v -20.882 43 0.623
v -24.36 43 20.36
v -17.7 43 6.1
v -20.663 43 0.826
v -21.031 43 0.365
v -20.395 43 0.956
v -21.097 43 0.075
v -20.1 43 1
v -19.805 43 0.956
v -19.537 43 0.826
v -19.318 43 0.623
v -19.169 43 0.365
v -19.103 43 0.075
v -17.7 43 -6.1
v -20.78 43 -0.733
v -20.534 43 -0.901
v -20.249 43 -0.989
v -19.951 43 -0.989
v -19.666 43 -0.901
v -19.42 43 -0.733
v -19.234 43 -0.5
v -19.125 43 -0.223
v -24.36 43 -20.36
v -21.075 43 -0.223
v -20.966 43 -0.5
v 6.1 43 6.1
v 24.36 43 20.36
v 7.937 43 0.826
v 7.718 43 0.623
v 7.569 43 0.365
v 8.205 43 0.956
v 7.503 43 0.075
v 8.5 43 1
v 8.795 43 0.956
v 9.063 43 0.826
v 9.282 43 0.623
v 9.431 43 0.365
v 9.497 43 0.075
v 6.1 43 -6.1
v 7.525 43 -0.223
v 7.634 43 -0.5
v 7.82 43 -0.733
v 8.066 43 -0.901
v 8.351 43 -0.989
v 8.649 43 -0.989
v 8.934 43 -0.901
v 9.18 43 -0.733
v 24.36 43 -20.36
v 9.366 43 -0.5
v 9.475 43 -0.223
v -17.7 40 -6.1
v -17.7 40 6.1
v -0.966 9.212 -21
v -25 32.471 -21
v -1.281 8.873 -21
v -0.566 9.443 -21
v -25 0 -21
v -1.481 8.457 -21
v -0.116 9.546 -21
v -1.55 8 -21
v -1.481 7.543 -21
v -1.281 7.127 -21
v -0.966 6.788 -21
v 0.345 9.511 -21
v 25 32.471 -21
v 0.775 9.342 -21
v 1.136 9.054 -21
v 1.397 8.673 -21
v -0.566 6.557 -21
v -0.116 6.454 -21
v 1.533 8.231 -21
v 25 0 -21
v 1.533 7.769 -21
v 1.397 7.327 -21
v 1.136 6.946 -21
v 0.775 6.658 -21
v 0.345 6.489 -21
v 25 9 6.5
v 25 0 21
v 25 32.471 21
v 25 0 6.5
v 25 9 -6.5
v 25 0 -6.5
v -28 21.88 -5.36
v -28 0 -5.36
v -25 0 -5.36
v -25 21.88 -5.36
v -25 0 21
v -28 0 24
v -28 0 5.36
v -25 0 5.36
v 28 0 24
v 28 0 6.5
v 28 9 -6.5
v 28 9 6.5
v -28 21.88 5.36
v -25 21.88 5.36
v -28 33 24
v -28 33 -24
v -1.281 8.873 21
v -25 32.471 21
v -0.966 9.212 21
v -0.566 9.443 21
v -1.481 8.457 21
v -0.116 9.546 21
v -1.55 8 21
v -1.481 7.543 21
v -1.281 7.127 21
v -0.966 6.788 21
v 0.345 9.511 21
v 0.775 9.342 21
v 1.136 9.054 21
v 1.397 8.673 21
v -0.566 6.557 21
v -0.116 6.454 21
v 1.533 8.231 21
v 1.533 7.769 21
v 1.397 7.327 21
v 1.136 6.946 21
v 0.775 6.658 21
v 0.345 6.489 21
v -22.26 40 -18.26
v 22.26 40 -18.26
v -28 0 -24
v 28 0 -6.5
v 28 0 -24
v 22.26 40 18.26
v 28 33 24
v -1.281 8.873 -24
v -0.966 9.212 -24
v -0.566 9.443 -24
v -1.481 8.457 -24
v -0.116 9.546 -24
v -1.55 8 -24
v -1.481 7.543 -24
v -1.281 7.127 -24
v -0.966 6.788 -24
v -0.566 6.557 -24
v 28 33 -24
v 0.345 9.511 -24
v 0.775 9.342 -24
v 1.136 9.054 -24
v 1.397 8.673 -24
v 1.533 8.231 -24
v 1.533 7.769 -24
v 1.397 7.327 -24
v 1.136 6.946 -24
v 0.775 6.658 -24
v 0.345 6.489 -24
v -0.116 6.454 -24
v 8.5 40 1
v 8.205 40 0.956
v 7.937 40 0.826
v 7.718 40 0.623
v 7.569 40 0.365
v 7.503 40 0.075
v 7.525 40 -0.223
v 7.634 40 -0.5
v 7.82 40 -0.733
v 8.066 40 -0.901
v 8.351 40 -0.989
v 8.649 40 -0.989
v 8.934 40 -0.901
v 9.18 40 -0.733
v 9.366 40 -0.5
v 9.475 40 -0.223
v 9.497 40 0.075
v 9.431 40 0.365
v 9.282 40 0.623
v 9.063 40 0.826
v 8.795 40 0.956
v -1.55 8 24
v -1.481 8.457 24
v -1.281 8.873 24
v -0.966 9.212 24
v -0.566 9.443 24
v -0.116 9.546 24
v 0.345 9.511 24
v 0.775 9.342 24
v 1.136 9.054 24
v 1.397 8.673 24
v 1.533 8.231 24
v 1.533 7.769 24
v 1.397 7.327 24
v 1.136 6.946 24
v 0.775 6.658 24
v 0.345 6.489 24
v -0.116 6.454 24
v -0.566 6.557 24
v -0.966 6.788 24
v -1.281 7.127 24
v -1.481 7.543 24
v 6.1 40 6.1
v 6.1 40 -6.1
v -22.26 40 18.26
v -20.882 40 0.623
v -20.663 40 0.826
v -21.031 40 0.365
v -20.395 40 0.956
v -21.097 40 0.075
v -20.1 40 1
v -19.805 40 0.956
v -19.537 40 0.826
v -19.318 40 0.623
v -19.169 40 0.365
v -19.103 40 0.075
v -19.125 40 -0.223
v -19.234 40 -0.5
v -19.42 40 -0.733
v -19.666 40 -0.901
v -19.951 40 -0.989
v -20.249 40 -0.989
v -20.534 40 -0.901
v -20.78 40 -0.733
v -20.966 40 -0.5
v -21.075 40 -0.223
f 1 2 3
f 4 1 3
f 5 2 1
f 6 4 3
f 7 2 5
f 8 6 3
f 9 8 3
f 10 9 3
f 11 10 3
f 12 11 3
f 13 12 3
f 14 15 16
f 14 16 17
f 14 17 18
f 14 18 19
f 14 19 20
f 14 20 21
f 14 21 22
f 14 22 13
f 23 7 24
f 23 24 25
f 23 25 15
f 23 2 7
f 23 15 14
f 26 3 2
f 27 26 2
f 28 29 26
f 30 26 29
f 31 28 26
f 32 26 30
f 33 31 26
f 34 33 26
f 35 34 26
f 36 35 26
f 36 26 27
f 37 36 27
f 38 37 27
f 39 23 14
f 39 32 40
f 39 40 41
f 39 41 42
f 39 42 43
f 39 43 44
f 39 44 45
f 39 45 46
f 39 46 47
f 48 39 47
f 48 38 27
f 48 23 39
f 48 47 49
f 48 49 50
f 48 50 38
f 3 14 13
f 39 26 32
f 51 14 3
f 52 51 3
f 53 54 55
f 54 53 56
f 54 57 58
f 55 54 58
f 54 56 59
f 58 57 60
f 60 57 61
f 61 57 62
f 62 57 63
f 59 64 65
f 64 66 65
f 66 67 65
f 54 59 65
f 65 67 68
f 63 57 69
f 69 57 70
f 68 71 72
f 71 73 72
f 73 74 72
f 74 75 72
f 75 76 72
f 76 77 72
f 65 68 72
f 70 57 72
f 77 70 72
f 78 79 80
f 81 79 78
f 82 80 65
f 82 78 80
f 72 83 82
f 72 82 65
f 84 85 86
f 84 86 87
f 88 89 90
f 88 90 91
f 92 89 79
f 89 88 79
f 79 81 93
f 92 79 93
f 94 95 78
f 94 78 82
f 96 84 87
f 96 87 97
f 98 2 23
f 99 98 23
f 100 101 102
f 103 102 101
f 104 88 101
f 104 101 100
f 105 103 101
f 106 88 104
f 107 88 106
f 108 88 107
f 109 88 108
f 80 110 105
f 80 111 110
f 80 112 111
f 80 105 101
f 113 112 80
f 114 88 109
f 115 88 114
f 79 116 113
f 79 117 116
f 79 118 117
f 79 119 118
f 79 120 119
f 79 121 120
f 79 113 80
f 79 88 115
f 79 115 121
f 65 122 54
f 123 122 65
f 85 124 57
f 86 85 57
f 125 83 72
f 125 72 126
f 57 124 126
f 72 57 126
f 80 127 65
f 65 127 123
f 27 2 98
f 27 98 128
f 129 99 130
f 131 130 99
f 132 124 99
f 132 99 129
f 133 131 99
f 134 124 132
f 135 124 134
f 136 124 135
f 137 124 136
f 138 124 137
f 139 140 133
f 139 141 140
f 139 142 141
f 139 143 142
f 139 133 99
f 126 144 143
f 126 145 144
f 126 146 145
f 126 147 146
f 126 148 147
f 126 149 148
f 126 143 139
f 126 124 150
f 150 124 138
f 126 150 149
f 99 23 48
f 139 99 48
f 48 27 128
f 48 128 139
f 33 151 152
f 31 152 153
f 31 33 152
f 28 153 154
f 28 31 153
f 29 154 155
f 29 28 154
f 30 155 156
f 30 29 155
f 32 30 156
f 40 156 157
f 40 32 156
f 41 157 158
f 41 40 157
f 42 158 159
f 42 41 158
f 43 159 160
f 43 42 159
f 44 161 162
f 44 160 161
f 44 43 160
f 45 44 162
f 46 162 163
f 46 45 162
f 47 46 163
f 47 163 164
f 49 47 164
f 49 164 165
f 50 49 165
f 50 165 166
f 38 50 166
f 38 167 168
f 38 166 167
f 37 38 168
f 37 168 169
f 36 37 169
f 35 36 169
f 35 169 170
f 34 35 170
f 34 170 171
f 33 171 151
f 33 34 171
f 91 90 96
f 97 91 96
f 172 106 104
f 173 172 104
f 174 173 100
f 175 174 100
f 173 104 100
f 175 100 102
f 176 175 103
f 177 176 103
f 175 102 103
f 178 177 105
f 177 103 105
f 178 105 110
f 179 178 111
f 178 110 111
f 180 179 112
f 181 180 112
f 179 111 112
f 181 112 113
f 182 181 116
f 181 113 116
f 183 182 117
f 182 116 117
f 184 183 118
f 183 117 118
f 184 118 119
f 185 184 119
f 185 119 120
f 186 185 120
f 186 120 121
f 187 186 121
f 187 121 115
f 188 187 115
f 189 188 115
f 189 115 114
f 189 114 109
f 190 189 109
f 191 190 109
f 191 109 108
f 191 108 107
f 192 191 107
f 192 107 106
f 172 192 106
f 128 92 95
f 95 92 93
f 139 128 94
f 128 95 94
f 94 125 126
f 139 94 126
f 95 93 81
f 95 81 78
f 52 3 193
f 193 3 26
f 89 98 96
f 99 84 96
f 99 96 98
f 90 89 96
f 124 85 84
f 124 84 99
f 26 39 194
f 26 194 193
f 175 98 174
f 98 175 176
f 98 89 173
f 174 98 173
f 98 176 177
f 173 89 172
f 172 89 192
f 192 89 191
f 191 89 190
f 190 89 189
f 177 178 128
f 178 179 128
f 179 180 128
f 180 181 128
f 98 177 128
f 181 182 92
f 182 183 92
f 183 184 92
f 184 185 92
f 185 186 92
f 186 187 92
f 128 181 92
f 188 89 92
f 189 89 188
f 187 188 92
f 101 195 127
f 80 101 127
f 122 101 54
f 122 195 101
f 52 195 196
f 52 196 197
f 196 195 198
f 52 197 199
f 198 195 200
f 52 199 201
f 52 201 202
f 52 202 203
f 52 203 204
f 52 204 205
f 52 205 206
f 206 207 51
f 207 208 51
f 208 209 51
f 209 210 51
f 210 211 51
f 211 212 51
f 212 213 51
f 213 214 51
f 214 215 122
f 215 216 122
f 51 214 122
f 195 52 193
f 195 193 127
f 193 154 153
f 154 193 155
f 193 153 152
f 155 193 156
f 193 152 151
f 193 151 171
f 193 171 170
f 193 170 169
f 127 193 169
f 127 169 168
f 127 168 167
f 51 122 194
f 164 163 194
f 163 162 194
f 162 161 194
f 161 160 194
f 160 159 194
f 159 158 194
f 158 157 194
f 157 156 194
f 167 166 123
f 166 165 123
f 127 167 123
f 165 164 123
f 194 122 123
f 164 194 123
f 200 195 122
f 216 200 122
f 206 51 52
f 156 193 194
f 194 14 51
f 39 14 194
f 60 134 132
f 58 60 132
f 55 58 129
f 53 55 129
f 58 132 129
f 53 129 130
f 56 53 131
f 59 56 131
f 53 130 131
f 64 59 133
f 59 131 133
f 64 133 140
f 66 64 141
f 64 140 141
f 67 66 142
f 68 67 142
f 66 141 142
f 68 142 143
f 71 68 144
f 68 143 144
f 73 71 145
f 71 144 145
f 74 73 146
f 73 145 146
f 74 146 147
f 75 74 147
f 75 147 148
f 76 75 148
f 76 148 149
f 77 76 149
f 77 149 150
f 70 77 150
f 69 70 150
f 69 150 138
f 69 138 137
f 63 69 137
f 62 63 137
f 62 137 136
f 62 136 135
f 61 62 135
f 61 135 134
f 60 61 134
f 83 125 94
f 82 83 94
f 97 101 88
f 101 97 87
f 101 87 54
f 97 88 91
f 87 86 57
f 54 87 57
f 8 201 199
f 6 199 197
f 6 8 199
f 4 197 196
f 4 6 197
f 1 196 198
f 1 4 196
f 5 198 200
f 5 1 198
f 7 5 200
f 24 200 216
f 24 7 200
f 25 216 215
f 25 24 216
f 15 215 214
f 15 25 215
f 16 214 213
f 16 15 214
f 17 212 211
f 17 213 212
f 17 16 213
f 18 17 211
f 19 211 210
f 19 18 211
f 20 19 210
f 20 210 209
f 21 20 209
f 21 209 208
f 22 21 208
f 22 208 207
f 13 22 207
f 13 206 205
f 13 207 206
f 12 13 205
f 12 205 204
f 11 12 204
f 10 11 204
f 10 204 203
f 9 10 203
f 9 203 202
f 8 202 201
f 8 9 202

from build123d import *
from OCP.BRepFilletAPI import BRepFilletAPI_MakeChamfer

# Parameters (mm, degrees)
SKETCH_47_W         = 56
SKETCH_47_H         = 48
EXTRUDE_4_DEPTH     = 43
CHAMFER_1_SIZE      = 10
CHAMFER_1_SIZE2     = 3.639702343
SHELL_1_T           = -3
CUT_EXTRUDE_3_REACH = 86.392
SKETCH_48_R         = 1
SKETCH_48_W         = 23.8
SKETCH_48_H         = 12.2
SKETCH_49_R         = 1.55
CUT_EXTRUDE_4_DEPTH = 71.263788682
CUT_EXTRUDE_5_REACH = 76.572
SKETCH_50_W         = 13
SKETCH_50_H         = 9
CUT_EXTRUDE_6_REACH = 76.572
SKETCH_51_W         = 10.719183514
SKETCH_51_H         = 21.879791556


with BuildPart() as part:
    # 草图47 → 凸台-拉伸4 (new body)
    with BuildSketch(Plane(origin=(0, 0, 0), x_dir=(1, 0, 0), z_dir=(0, 1, 0))):
        Rectangle(SKETCH_47_W, SKETCH_47_H)
    extrude(amount=EXTRUDE_4_DEPTH)

    # 倒角1: one chamfer whose edges measure the first distance from different faces: ONE call of the kernel's chamfer builder (chamfer() names one face for all edges)
    chamfer_1_edges_1 = [part.edges().sort_by_distance(p)[0] for p in [
        (28, 43, 0),
    ]]
    chamfer_1_side_1 = [part.faces().sort_by_distance(p)[0] for p in [
        (28, 21.5, 0),
    ]]
    chamfer_1_edges_2 = [part.edges().sort_by_distance(p)[0] for p in [
        (0, 43, -24),
    ]]
    chamfer_1_side_2 = [part.faces().sort_by_distance(p)[0] for p in [
        (0, 21.5, -24),
    ]]
    chamfer_1_edges_3 = [part.edges().sort_by_distance(p)[0] for p in [
        (-28, 43, 0),
    ]]
    chamfer_1_side_3 = [part.faces().sort_by_distance(p)[0] for p in [
        (-28, 21.5, 0),
    ]]
    chamfer_1_edges_4 = [part.edges().sort_by_distance(p)[0] for p in [
        (0, 43, 24),
    ]]
    chamfer_1_side_4 = [part.faces().sort_by_distance(p)[0] for p in [
        (0, 21.5, 24),
    ]]
    chamfer_1 = BRepFilletAPI_MakeChamfer(part.part.solid().wrapped)
    for e in chamfer_1_edges_1:
        chamfer_1.Add(CHAMFER_1_SIZE, CHAMFER_1_SIZE2, e.wrapped, chamfer_1_side_1[0].wrapped)  # the first distance lies on this face
    for e in chamfer_1_edges_2:
        chamfer_1.Add(CHAMFER_1_SIZE, CHAMFER_1_SIZE2, e.wrapped, chamfer_1_side_2[0].wrapped)  # the first distance lies on this face
    for e in chamfer_1_edges_3:
        chamfer_1.Add(CHAMFER_1_SIZE, CHAMFER_1_SIZE2, e.wrapped, chamfer_1_side_3[0].wrapped)  # the first distance lies on this face
    for e in chamfer_1_edges_4:
        chamfer_1.Add(CHAMFER_1_SIZE, CHAMFER_1_SIZE2, e.wrapped, chamfer_1_side_4[0].wrapped)  # the first distance lies on this face
    add(Compound.cast(chamfer_1.Shape()), mode=Mode.REPLACE)

    # 抽壳1
    shell_1_openings = [part.faces().sort_by_distance(p)[0] for p in [
        (0, 0, 0),
    ]]
    offset(amount=SHELL_1_T, openings=shell_1_openings, kind=Kind.INTERSECTION)

    # 草图48 → 切除-拉伸3 (cut, up to next)
    with BuildSketch(Plane(origin=(0, 43, -43), x_dir=(1, 0, 0), z_dir=(0, -1, 0)), mode=Mode.PRIVATE) as cut_extrude_3_sk1:
        with Locations(Location((-20.1, 43, 0), (0, 0, 90))):
            Circle(SKETCH_48_R)
    cut_extrude_3_tool1 = extrude(cut_extrude_3_sk1.sketch, amount=CUT_EXTRUDE_3_REACH, mode=Mode.PRIVATE) & part.part
    # 草图48 → 切除-拉伸3 (cut, up to next)
    with BuildSketch(Plane(origin=(0, 43, -43), x_dir=(1, 0, 0), z_dir=(0, -1, 0)), mode=Mode.PRIVATE) as cut_extrude_3_sk2:
        with Locations(Location((8.5, 43, 0), (0, 0, 90))):
            Circle(SKETCH_48_R)
    cut_extrude_3_tool2 = extrude(cut_extrude_3_sk2.sketch, amount=CUT_EXTRUDE_3_REACH, mode=Mode.PRIVATE) & part.part
    # 草图48 → 切除-拉伸3 (cut, up to next)
    with BuildSketch(Plane(origin=(0, 43, -43), x_dir=(1, 0, 0), z_dir=(0, -1, 0)), mode=Mode.PRIVATE) as cut_extrude_3_sk3:
        with Locations((-5.8, 43)):
            Rectangle(SKETCH_48_W, SKETCH_48_H)
    cut_extrude_3_tool3 = extrude(cut_extrude_3_sk3.sketch, amount=CUT_EXTRUDE_3_REACH, mode=Mode.PRIVATE) & part.part
    add(cut_extrude_3_tool1.solids().sort_by_distance((-20.1, 43, 0))[0], mode=Mode.SUBTRACT)
    add(cut_extrude_3_tool2.solids().sort_by_distance((8.5, 43, 0))[0], mode=Mode.SUBTRACT)
    add(cut_extrude_3_tool3.solids().sort_by_distance((-5.8, 43, 0))[0], mode=Mode.SUBTRACT)

    # 草图49 → 切除-拉伸4 (cut, through all)
    with BuildSketch(Plane(origin=(0, 0, -24), x_dir=(-1, 0, 0), z_dir=(0, 0, -1))):
        with Locations((0, 8)):
            Circle(SKETCH_49_R)
    extrude(amount=-CUT_EXTRUDE_4_DEPTH, mode=Mode.SUBTRACT)

    # 草图50 → 切除-拉伸5 (cut, up to next)
    with BuildSketch(Plane(origin=(28, 0, 0), x_dir=(0, 0, -1), z_dir=(1, 0, 0)), mode=Mode.PRIVATE) as cut_extrude_5_sk1:
        with Locations((0, 4.5)):
            Rectangle(SKETCH_50_W, SKETCH_50_H)
    cut_extrude_5_tool1 = extrude(cut_extrude_5_sk1.sketch, amount=-CUT_EXTRUDE_5_REACH, mode=Mode.PRIVATE) & part.part
    add(cut_extrude_5_tool1.solids().sort_by_distance((28, 4.5, 0))[0], mode=Mode.SUBTRACT)

    # 草图51 → 切除-拉伸6 (cut, up to next)
    with BuildSketch(Plane.ZY.offset(28), mode=Mode.PRIVATE) as cut_extrude_6_sk1:
        with Locations((0, 10.939895778)):
            Rectangle(SKETCH_51_W, SKETCH_51_H)
    cut_extrude_6_tool1 = extrude(cut_extrude_6_sk1.sketch, amount=-CUT_EXTRUDE_6_REACH, mode=Mode.PRIVATE) & part.part
    add(cut_extrude_6_tool1.solids().sort_by_distance((-28, 10.939896, 0))[0], mode=Mode.SUBTRACT)


solid = part.part
